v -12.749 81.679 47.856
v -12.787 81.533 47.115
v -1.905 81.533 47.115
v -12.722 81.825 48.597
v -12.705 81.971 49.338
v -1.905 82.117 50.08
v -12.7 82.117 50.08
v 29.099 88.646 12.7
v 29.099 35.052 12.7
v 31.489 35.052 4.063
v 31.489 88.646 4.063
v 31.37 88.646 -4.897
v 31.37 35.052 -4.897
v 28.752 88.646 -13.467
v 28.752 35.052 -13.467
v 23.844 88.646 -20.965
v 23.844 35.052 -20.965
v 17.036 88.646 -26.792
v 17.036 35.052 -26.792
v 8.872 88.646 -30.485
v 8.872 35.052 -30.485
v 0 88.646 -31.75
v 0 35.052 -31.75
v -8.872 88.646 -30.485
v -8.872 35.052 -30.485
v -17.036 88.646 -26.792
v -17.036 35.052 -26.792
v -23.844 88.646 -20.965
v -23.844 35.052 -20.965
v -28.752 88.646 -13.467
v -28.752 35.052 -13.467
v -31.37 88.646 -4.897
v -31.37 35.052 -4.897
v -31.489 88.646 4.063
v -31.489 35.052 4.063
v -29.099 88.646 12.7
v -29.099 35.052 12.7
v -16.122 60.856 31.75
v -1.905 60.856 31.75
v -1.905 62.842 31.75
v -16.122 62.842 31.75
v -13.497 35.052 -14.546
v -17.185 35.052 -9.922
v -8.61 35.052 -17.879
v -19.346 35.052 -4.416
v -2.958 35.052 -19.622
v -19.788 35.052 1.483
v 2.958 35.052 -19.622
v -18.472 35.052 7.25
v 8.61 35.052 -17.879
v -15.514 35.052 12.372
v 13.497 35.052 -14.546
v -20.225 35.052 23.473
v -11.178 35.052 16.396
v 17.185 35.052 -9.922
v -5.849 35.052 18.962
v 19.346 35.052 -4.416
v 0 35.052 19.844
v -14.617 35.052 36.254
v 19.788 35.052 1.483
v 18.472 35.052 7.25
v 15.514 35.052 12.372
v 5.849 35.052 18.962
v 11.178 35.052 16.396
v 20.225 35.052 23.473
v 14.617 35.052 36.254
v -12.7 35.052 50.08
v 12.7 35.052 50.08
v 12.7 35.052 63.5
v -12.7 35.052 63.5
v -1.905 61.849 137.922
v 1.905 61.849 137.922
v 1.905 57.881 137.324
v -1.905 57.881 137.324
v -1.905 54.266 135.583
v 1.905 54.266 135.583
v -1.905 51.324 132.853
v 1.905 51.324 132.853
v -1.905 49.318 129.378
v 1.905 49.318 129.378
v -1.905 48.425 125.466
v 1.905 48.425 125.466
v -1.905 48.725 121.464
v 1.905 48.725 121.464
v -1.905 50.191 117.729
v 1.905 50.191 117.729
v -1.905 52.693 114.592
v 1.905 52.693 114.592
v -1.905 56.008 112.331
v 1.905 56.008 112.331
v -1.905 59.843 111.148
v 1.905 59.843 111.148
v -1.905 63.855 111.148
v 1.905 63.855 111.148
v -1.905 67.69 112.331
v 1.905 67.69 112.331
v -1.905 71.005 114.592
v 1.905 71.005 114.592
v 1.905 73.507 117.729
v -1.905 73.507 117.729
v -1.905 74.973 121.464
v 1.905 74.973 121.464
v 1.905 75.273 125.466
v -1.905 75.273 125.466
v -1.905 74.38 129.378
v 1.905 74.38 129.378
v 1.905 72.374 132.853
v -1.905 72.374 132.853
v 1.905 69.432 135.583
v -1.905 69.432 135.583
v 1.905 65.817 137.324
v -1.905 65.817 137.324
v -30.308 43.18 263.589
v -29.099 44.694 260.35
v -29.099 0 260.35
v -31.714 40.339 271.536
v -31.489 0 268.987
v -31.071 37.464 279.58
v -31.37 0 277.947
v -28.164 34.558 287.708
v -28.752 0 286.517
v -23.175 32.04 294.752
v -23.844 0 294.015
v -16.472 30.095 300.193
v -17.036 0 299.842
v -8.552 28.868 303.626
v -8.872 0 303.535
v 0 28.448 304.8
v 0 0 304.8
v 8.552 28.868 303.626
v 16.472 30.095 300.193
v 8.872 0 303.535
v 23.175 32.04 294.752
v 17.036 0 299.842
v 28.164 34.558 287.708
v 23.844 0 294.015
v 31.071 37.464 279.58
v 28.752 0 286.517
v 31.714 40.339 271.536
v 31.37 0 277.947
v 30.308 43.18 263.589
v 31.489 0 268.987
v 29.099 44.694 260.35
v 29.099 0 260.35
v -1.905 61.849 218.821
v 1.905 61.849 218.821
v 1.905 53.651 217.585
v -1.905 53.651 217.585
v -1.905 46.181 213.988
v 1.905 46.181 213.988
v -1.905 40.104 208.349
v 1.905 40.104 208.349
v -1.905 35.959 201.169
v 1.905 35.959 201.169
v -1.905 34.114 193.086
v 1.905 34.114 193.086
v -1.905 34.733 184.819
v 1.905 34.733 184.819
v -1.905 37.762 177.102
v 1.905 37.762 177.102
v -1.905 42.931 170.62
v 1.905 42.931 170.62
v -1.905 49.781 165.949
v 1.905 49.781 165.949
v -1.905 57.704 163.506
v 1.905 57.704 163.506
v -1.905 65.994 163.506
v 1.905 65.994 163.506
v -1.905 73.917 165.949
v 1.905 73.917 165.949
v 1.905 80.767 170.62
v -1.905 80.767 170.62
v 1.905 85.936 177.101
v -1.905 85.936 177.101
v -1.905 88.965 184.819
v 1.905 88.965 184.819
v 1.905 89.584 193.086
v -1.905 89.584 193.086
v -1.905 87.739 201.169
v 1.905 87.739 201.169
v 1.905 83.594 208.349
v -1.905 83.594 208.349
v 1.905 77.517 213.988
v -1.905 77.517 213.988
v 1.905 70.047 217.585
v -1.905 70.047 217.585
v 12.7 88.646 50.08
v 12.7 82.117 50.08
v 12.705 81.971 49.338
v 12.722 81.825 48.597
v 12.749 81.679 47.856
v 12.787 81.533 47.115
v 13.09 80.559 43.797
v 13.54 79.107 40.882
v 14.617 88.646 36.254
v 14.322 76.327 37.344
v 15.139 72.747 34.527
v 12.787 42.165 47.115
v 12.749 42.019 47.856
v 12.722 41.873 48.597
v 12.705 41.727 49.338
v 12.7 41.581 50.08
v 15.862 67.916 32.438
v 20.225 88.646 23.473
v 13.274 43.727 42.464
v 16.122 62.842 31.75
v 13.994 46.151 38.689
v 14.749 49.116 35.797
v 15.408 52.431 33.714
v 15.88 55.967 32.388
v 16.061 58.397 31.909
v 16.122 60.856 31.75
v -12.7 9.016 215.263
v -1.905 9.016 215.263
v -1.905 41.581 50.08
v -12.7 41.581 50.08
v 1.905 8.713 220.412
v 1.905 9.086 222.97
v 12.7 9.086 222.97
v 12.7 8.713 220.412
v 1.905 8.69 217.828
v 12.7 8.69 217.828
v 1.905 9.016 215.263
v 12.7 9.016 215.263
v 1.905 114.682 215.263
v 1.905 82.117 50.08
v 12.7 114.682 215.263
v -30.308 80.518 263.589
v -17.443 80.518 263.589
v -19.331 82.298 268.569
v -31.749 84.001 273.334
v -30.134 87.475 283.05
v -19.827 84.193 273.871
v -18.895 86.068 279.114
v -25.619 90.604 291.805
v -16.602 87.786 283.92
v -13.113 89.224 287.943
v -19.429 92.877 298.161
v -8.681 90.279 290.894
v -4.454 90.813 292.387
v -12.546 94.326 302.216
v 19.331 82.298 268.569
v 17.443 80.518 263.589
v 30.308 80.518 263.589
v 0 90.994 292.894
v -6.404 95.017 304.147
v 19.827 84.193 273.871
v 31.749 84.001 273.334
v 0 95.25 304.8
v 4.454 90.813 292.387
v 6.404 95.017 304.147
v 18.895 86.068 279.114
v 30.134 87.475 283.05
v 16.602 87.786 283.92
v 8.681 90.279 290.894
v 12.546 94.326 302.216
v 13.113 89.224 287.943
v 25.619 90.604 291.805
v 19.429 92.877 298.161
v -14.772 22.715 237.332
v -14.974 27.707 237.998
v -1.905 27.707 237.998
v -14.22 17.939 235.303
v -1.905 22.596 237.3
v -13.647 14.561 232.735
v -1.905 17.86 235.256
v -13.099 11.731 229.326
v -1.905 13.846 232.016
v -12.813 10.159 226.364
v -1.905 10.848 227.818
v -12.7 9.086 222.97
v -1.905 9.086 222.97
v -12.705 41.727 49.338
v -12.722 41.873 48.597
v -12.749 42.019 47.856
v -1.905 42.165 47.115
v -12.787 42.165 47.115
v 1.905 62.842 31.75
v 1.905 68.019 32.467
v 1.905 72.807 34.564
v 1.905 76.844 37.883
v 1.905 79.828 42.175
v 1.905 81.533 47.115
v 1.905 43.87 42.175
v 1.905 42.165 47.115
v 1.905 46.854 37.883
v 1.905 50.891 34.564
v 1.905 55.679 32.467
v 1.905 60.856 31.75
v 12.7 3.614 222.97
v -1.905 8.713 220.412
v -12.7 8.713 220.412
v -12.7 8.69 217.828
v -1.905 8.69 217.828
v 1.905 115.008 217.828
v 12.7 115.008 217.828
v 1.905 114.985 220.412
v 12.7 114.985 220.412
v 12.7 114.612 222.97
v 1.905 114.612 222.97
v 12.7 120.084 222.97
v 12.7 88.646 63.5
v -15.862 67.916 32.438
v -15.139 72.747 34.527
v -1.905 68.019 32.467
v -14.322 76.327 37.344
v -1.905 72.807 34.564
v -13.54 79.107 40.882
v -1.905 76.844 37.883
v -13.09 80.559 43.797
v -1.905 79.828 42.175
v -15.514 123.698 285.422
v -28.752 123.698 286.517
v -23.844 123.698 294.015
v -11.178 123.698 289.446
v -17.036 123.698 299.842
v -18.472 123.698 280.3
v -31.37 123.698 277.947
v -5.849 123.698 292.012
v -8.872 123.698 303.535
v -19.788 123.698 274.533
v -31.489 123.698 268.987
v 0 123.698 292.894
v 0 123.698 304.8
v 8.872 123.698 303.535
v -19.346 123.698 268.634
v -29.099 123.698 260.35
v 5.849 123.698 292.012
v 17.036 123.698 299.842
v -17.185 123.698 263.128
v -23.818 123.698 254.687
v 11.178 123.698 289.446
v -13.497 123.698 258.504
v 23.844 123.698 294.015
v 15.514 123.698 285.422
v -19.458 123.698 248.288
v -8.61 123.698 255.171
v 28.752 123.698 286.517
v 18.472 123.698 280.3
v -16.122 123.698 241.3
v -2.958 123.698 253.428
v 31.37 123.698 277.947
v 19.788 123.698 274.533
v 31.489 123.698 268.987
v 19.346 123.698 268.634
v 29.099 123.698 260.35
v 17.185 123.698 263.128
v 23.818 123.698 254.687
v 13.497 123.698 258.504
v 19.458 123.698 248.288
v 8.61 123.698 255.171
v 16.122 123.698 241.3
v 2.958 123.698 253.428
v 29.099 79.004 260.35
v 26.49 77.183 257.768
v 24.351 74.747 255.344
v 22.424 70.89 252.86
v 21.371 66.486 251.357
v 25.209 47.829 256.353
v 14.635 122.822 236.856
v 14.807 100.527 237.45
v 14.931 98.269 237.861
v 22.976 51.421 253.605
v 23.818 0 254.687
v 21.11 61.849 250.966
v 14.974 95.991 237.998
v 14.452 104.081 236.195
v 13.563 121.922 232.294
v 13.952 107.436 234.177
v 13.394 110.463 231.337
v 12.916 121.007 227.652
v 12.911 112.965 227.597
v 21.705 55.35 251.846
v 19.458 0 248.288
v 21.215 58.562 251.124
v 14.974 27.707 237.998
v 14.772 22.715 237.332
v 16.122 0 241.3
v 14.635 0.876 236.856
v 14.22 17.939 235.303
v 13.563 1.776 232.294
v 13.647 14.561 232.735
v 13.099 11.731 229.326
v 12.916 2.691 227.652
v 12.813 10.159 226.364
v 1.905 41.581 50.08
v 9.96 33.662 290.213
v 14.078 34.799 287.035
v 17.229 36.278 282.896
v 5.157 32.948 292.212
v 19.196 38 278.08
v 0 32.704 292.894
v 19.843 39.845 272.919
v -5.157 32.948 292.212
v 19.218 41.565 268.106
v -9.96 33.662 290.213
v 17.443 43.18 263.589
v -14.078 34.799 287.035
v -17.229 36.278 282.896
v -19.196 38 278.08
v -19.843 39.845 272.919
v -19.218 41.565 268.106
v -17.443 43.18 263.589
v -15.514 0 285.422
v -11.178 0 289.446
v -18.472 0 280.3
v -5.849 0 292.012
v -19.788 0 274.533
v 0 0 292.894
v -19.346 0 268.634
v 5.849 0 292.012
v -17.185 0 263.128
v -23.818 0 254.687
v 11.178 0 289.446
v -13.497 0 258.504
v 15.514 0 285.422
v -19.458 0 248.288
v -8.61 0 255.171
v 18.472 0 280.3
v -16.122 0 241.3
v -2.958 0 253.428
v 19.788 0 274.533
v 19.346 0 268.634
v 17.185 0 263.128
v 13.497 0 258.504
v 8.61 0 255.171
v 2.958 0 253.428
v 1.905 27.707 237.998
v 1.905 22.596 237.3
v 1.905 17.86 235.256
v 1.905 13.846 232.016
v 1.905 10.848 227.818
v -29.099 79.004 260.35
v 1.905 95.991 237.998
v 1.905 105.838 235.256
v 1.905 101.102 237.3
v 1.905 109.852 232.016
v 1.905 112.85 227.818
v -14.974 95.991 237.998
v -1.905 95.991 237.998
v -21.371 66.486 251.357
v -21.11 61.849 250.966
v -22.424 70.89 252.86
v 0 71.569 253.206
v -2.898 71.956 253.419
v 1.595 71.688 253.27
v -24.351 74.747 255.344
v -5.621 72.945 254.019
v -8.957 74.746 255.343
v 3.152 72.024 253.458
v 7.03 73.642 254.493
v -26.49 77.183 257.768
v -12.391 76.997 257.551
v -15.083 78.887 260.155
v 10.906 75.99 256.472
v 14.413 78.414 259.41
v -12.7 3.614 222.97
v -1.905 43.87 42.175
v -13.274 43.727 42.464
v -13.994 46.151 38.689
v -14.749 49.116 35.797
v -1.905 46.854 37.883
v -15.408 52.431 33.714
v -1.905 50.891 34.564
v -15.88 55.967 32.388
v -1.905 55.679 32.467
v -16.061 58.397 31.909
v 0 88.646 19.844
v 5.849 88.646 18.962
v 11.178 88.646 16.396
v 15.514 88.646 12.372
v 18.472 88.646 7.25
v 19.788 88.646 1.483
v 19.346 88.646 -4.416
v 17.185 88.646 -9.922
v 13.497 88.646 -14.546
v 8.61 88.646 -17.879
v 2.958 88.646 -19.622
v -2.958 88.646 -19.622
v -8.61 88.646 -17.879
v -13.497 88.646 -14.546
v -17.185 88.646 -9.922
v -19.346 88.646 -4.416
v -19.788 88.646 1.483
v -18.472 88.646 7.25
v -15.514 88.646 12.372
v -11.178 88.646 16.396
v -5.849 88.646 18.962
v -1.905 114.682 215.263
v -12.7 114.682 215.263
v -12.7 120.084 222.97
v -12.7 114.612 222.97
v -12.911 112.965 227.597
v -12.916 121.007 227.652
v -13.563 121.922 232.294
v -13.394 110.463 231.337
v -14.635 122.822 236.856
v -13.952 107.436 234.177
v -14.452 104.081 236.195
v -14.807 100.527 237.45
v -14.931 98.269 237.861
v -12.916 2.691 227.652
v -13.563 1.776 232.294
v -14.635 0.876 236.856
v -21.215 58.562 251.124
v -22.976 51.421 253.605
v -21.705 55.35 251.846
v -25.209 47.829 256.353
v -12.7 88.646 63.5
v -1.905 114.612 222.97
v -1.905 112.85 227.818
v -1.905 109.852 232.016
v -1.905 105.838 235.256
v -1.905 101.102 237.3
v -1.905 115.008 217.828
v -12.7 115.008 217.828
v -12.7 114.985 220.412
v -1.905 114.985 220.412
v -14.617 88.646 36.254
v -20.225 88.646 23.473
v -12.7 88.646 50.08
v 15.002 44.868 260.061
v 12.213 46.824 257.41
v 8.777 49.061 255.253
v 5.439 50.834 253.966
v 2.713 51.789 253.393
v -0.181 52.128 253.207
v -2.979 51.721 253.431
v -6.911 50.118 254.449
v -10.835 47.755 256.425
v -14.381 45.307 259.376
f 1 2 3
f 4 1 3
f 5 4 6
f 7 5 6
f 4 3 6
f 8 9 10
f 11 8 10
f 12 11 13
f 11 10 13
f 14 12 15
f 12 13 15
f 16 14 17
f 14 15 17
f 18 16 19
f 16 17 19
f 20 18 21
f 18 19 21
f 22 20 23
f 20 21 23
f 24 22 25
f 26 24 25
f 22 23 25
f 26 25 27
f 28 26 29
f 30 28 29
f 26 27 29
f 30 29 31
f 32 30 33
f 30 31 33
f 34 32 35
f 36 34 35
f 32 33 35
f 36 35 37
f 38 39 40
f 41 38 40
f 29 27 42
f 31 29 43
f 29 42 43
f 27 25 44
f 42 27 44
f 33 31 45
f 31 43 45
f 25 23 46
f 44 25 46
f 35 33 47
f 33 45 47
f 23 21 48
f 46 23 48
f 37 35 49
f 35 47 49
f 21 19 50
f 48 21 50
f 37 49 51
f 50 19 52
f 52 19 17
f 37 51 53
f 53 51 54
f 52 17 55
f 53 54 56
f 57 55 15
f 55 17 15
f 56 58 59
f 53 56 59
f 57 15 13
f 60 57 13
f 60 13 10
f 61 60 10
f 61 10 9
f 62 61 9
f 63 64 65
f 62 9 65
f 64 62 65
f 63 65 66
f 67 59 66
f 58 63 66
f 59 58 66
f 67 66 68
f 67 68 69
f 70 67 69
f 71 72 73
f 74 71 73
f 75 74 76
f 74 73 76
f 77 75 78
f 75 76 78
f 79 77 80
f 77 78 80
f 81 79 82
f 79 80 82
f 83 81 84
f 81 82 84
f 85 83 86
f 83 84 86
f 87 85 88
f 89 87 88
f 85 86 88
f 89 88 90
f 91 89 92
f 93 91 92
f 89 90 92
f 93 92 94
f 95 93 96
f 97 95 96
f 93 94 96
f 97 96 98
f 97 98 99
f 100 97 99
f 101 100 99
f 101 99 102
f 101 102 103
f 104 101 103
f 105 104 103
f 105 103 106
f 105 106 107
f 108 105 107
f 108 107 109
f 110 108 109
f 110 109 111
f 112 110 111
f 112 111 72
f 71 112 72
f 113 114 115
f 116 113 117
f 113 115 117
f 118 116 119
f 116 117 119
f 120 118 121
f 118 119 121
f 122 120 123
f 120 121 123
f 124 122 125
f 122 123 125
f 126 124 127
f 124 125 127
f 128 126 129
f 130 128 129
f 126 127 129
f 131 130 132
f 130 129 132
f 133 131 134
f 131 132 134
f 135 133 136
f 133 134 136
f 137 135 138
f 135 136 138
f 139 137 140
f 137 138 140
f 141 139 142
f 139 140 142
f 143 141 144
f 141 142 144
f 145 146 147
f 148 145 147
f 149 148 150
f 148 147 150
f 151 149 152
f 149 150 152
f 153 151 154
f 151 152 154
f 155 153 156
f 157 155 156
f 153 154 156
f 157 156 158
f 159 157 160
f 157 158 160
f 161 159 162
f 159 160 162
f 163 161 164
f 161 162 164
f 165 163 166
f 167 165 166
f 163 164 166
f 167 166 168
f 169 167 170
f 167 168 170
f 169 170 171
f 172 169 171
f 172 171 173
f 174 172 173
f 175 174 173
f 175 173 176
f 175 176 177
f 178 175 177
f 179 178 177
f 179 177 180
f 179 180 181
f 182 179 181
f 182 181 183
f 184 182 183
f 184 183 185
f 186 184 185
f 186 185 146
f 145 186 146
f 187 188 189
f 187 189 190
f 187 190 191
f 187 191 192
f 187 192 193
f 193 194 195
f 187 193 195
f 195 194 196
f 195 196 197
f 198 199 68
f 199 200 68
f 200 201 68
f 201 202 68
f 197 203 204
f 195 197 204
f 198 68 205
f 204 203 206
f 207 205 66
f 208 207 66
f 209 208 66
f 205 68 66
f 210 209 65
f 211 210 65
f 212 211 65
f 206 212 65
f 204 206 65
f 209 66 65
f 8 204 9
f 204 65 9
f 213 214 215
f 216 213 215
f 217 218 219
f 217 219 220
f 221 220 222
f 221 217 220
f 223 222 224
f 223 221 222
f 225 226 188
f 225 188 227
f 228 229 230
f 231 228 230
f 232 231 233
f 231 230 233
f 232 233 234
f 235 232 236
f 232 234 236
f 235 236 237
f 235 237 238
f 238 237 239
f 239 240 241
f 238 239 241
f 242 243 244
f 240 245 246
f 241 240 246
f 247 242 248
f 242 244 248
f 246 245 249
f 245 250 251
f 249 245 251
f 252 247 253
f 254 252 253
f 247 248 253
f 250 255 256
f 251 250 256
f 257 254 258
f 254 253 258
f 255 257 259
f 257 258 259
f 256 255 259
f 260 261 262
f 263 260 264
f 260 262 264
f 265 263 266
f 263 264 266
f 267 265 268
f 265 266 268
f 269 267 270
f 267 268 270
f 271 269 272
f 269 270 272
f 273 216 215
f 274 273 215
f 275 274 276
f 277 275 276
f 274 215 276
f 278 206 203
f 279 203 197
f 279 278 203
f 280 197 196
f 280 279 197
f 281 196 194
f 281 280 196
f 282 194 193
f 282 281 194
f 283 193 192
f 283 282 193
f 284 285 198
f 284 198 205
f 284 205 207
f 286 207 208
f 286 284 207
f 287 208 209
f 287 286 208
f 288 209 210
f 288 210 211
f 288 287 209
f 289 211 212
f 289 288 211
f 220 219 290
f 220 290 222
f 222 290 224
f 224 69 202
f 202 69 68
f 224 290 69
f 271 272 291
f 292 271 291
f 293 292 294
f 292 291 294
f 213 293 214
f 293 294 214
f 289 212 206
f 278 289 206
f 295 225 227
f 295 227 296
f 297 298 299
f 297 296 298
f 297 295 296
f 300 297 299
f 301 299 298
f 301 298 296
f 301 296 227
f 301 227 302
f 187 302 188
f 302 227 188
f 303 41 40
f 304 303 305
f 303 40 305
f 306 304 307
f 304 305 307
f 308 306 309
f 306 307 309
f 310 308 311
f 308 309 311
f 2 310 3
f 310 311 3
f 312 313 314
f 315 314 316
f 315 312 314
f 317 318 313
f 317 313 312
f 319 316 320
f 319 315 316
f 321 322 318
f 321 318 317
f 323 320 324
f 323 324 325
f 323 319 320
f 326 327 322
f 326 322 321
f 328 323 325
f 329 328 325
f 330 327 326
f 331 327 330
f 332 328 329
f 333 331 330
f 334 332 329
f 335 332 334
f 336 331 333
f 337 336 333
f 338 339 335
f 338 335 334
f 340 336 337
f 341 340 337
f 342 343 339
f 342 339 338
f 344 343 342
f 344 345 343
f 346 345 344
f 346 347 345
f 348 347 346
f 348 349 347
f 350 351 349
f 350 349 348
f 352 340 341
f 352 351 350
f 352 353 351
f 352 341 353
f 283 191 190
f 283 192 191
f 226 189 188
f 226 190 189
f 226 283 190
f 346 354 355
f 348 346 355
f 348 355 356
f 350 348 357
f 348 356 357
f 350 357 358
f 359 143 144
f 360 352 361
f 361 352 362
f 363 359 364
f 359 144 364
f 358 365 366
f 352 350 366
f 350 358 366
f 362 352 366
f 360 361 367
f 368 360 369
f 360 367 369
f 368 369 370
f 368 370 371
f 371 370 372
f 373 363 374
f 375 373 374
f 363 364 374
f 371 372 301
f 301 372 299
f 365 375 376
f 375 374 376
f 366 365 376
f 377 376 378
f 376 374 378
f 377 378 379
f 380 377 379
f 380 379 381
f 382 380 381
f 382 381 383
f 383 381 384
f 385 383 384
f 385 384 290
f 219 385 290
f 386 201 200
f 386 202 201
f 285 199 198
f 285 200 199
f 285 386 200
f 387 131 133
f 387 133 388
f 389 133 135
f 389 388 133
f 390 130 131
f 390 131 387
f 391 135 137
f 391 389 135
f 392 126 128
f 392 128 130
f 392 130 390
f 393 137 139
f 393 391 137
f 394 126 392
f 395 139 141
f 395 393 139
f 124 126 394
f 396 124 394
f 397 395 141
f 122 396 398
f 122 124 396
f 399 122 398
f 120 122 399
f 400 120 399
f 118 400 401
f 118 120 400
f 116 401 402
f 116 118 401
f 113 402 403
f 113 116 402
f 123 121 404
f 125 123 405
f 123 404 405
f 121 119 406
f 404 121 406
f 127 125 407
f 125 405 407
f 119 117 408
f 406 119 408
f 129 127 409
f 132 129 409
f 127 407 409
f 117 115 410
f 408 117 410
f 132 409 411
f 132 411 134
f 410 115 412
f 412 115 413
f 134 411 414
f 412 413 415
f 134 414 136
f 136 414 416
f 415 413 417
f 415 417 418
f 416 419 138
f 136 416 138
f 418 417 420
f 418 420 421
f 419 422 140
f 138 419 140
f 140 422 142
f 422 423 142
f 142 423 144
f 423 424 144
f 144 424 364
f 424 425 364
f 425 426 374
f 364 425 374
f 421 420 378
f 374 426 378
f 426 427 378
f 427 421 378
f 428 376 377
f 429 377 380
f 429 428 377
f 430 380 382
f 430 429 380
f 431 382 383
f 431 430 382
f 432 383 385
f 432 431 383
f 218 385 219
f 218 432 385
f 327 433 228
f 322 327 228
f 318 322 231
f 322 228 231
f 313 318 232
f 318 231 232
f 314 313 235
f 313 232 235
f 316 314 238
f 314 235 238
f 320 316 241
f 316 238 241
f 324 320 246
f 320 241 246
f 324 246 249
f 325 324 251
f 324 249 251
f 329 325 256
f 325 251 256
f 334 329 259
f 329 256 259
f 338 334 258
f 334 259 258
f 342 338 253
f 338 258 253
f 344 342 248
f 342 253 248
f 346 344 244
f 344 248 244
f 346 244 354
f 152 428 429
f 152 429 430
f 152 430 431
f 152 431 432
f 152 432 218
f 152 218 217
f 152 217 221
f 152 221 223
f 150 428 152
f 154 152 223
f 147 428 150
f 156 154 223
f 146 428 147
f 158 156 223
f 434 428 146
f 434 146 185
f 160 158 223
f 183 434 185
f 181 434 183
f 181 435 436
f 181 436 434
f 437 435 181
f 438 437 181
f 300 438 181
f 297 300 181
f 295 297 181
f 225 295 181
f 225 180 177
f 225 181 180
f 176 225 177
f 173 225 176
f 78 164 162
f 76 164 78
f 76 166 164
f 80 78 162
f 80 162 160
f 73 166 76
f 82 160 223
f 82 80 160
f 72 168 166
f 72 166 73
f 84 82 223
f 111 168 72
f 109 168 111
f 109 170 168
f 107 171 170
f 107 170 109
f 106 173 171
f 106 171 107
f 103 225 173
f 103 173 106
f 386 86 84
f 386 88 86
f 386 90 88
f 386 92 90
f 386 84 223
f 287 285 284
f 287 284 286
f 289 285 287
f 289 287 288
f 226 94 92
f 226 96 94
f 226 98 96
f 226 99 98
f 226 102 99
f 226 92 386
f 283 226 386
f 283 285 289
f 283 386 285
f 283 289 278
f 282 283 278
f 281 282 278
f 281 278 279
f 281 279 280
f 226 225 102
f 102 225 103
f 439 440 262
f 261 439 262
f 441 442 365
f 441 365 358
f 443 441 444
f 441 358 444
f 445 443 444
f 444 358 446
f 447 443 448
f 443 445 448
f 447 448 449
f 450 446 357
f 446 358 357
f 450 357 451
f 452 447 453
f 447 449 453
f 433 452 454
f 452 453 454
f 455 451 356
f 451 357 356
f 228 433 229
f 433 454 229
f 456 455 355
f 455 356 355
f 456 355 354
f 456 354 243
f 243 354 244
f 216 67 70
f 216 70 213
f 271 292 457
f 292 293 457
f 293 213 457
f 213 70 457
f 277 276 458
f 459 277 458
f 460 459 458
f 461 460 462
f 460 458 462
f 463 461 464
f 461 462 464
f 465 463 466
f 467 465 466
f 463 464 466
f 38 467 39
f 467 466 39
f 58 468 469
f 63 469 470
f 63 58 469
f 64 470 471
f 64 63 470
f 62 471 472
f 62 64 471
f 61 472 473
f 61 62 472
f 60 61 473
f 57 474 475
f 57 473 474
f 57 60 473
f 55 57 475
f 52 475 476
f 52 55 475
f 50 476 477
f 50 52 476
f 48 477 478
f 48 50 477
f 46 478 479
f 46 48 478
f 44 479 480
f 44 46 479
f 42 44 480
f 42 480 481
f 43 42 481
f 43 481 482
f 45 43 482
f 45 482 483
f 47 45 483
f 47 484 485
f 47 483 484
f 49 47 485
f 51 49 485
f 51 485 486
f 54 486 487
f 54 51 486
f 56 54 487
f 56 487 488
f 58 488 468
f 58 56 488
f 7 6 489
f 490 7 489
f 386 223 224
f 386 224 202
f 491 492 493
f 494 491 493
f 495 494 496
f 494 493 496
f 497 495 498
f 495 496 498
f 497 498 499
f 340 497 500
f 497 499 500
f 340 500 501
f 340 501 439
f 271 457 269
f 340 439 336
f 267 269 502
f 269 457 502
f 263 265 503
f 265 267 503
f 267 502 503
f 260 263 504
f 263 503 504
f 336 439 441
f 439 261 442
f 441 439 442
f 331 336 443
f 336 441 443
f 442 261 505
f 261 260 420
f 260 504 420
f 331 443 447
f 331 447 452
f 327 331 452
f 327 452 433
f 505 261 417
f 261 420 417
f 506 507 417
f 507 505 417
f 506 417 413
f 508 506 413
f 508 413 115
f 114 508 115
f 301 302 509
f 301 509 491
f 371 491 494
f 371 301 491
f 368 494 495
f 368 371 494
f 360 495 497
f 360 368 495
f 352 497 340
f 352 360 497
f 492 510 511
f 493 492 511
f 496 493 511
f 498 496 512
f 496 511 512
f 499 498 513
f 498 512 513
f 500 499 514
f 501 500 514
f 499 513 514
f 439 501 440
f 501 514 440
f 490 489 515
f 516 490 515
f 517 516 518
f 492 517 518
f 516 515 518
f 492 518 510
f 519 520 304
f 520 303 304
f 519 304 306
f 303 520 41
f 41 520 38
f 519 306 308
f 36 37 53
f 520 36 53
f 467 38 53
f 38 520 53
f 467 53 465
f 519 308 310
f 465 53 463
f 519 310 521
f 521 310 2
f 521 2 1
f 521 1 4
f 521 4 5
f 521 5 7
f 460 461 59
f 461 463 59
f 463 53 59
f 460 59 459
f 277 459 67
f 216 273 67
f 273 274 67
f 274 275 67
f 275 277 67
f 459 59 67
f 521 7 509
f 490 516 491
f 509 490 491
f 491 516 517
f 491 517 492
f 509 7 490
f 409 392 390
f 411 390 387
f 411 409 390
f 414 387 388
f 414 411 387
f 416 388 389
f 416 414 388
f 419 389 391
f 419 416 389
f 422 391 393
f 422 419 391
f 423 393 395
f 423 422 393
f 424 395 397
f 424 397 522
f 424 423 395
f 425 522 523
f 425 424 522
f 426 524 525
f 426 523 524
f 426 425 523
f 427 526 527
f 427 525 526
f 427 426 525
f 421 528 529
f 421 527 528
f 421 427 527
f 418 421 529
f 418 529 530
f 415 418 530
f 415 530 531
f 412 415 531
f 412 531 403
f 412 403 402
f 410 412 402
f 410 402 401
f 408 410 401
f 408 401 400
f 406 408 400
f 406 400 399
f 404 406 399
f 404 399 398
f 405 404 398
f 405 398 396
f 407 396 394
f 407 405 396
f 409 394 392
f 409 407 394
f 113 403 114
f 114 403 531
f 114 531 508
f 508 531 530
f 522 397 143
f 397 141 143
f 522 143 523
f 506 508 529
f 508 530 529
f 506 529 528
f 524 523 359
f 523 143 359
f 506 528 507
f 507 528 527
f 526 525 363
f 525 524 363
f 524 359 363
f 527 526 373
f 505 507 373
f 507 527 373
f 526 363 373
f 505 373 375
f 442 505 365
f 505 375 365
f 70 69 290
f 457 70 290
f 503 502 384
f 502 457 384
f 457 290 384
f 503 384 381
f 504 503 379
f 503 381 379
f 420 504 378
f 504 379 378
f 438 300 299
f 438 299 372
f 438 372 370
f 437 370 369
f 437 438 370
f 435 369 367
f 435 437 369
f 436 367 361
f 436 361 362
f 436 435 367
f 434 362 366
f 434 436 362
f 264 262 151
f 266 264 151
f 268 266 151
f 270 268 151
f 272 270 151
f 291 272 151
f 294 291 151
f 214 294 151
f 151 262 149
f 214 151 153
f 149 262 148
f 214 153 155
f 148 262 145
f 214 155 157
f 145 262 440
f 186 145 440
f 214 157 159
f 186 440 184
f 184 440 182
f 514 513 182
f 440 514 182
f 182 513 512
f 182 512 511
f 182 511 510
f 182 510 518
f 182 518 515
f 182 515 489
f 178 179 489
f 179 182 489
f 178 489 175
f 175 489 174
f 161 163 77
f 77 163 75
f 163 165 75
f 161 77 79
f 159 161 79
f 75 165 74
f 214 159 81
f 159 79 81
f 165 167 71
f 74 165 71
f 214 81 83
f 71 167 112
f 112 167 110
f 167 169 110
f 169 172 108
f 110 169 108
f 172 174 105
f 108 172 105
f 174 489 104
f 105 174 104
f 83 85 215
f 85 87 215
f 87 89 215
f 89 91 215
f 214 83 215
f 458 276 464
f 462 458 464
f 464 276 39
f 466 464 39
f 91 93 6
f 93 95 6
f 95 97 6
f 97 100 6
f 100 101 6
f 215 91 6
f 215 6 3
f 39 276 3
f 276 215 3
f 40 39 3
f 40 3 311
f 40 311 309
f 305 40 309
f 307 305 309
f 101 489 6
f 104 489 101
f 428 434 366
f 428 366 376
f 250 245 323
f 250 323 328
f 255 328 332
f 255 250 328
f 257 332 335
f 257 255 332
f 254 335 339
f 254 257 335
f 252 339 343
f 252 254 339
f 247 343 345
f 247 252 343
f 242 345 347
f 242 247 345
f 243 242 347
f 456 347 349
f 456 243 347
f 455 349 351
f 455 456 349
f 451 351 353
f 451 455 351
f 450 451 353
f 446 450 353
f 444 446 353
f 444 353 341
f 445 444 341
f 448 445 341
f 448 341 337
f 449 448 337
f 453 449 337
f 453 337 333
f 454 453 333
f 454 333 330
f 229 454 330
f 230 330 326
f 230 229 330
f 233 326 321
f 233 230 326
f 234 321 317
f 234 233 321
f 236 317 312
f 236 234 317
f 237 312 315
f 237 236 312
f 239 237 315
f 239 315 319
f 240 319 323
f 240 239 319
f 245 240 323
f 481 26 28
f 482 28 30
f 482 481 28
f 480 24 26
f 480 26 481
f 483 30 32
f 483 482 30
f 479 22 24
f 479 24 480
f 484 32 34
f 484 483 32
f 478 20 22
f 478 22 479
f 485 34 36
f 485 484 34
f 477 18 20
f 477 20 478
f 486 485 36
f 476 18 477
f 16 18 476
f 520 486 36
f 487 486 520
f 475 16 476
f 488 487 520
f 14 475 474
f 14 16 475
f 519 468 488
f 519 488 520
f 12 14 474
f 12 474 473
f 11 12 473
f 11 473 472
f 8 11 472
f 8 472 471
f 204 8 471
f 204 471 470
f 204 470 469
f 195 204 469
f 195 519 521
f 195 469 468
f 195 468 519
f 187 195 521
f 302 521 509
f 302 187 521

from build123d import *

# Parameters (mm, degrees)
SKETCH2_R               = 19.84375
BOSS_EXTRUDE1_DEPTH     = 123.698
SKETCH3_R               = 19.05
CUT_EXTRUDE1_DEPTH      = 331.472839586
CUT_EXTRUDE1_DEPTH_BACK = 331.472839586
CUT_EXTRUDE2_START      = -10.795
CUT_EXTRUDE2_DEPTH      = 343.728785262


with BuildPart() as part:
    # Sketch2 → Boss-Extrude1 (new body)
    with BuildSketch(Plane(origin=(0, 0, 0), x_dir=(1, 0, 0), z_dir=(0, 1, 0))):
        with BuildLine():
            Line((-12.7, -50.079615691), (-12.7, -222.970384309))
            ThreePointArc((-12.7, -222.970384309), (-16.980150837, -243.379784933), (-29.099355663, -260.35))
            ThreePointArc((-29.099355663, -260.35), (0, -304.8), (29.099355663, -260.35))
            ThreePointArc((29.099355663, -260.35), (16.980150837, -243.379784933), (12.7, -222.970384309))
            Line((12.7, -222.970384309), (12.7, -50.079615691))
            ThreePointArc((12.7, -50.079615691), (16.980150837, -29.670215067), (29.099355663, -12.7))
            ThreePointArc((29.099355663, -12.7), (0, 31.75), (-29.099355663, -12.7))
            ThreePointArc((-29.099355663, -12.7), (-16.980150837, -29.670215067), (-12.7, -50.079615691))
        make_face()
        with Locations(Location((0, -273.05, 0), (0, 0, 270))):
            Circle(SKETCH2_R, mode=Mode.SUBTRACT)
        with Locations(Location((0, 0, 0), (0, 0, 270))):
            Circle(SKETCH2_R, mode=Mode.SUBTRACT)
    extrude(amount=BOSS_EXTRUDE1_DEPTH)

    # Sketch3 → Cut-Extrude1 (cut, two sides)
    with BuildSketch(Plane(origin=(0, 0, 0), x_dir=(0, 0, -1), z_dir=(1, 0, 0))) as cut_extrude1_sk:
        with BuildLine():
            Line((-289.037979654, 61.849), (-250.966020346, 61.849))
            ThreePointArc((-250.966020346, 61.849), (-270.002, 80.168261599), (-289.037979654, 61.849))
        make_face()
        with BuildLine():
            ThreePointArc((-289.037979654, 61.849), (-270.002, 43.529738401), (-250.966020346, 61.849))
            Line((-250.966020346, 61.849), (-289.037979654, 61.849))
        make_face()
        with Locations((-270.002, 61.118261599)):
            Circle(SKETCH3_R)
        with Locations((-270.002, 62.579738401)):
            Circle(SKETCH3_R)
        with BuildLine():
            ThreePointArc((-263.589413096, 43.18), (-281.270114367, 45.758180264), (-289.037979654, 61.849))
            Line((-289.037979654, 61.849), (-304.8, 61.849))
            Line((-304.8, 61.849), (-304.8, 28.448))
            Line((-304.8, 28.448), (-263.589413096, 43.18))
        make_face()
        with BuildLine():
            ThreePointArc((-289.037979654, 61.849), (-281.270114367, 77.939819736), (-263.589413096, 80.518))
            Line((-263.589413096, 80.518), (-304.8, 95.25))
            Line((-304.8, 95.25), (-304.8, 61.849))
            Line((-304.8, 61.849), (-289.037979654, 61.849))
        make_face()
        with BuildLine():
            ThreePointArc((-163.195, 61.849), (-191.008, 89.662), (-218.821, 61.849))
            Line((-218.821, 61.849), (-163.195, 61.849))
        make_face()
        with BuildLine():
            Line((-163.195, 61.849), (-218.821, 61.849))
            ThreePointArc((-218.821, 61.849), (-191.008, 34.036), (-163.195, 61.849))
        make_face()
        Polygon((31.75, 88.646), (-63.5, 88.646), (-241.3, 123.698), (31.75, 123.698), align=None)
        Polygon((31.75, 0), (31.75, 35.052), (-63.5, 35.052), (-241.3, 0), align=None)
        with BuildLine():
            ThreePointArc((-110.998, 61.849), (-124.46, 75.311), (-137.922, 61.849))
            Line((-137.922, 61.849), (-110.998, 61.849))
        make_face()
        with BuildLine():
            Line((-110.998, 61.849), (-137.922, 61.849))
            ThreePointArc((-137.922, 61.849), (-124.46, 48.387), (-110.998, 61.849))
        make_face()
    extrude(amount=CUT_EXTRUDE1_DEPTH, mode=Mode.SUBTRACT)
    extrude(cut_extrude1_sk.sketch, amount=-CUT_EXTRUDE1_DEPTH_BACK, mode=Mode.SUBTRACT)

    # Sketch4 → Cut-Extrude2 (cut)
    with BuildSketch(Plane(origin=(12.7, 0, 0), x_dir=(0, 0, -1), z_dir=(1, 0, 0)).offset(CUT_EXTRUDE2_START)):
        with BuildLine():
            Line((-50.079615691, 82.116934418), (-215.26334861, 114.681727479))
            ThreePointArc((-215.26334861, 114.681727479), (-219.120431461, 115.040686403), (-222.970384309, 114.611964231))
            Line((-222.970384309, 114.611964231), (-222.970384309, 61.849))
            Line((-222.970384309, 61.849), (-218.821, 61.849))
            ThreePointArc((-218.821, 61.849), (-191.008, 89.662), (-163.195, 61.849))
            Line((-163.195, 61.849), (-137.922, 61.849))
            ThreePointArc((-137.922, 61.849), (-124.46, 75.311), (-110.998, 61.849))
            Line((-110.998, 61.849), (-50.079615691, 61.849))
            Line((-50.079615691, 61.849), (-50.079615691, 82.116934418))
        make_face()
        with BuildLine():
            Line((-222.970384309, 61.849), (-222.970384309, 114.611964231))
            ThreePointArc((-222.970384309, 114.611964231), (-233.772454814, 107.955497873), (-237.998, 95.991466803))
            Line((-237.998, 95.991466803), (-237.998, 61.849))
            Line((-237.998, 61.849), (-222.970384309, 61.849))
        make_face()
        with BuildLine():
            Line((-222.970384309, 9.086035769), (-222.970384309, 61.849))
            Line((-222.970384309, 61.849), (-237.998, 61.849))
            Line((-237.998, 61.849), (-237.998, 27.706533197))
            ThreePointArc((-237.998, 27.706533197), (-233.772454814, 15.742502127), (-222.970384309, 9.086035769))
        make_face()
        with BuildLine():
            Line((-50.079615691, 41.581065582), (-50.079615691, 61.849))
            Line((-50.079615691, 61.849), (-110.998, 61.849))
            ThreePointArc((-110.998, 61.849), (-124.46, 48.387), (-137.922, 61.849))
            Line((-137.922, 61.849), (-163.195, 61.849))
            ThreePointArc((-163.195, 61.849), (-191.008, 34.036), (-218.821, 61.849))
            Line((-218.821, 61.849), (-222.970384309, 61.849))
            Line((-222.970384309, 61.849), (-222.970384309, 9.086035769))
            ThreePointArc((-222.970384309, 9.086035769), (-219.120431461, 8.657313597), (-215.26334861, 9.016272521))
            Line((-215.26334861, 9.016272521), (-50.079615691, 41.581065582))
        make_face()
        with BuildLine():
            Line((-31.75, 61.849), (-50.079615691, 61.849))
            Line((-50.079615691, 61.849), (-50.079615691, 41.581065582))
            Line((-50.079615691, 41.581065582), (-47.11534861, 42.165449664))
            ThreePointArc((-47.11534861, 42.165449664), (-36.084445152, 48.757985533), (-31.75, 60.85571034))
            Line((-31.75, 60.85571034), (-31.75, 61.849))
        make_face()
        with BuildLine():
            Line((-47.11534861, 81.532550336), (-50.079615691, 82.116934418))
            Line((-50.079615691, 82.116934418), (-50.079615691, 61.849))
            Line((-50.079615691, 61.849), (-31.75, 61.849))
            Line((-31.75, 61.849), (-31.75, 62.84228966))
            ThreePointArc((-31.75, 62.84228966), (-36.084445152, 74.940014467), (-47.11534861, 81.532550336))
        make_face()
    cut_extrude2 = extrude(amount=CUT_EXTRUDE2_DEPTH, mode=Mode.SUBTRACT)

    # Mirror1: Cut-Extrude2 across plane
    add(cut_extrude2.mirror(Plane(origin=(0, 0, 0), x_dir=(0, 0, 1), z_dir=(1, 0, 0))), mode=Mode.SUBTRACT)


solid = part.part
